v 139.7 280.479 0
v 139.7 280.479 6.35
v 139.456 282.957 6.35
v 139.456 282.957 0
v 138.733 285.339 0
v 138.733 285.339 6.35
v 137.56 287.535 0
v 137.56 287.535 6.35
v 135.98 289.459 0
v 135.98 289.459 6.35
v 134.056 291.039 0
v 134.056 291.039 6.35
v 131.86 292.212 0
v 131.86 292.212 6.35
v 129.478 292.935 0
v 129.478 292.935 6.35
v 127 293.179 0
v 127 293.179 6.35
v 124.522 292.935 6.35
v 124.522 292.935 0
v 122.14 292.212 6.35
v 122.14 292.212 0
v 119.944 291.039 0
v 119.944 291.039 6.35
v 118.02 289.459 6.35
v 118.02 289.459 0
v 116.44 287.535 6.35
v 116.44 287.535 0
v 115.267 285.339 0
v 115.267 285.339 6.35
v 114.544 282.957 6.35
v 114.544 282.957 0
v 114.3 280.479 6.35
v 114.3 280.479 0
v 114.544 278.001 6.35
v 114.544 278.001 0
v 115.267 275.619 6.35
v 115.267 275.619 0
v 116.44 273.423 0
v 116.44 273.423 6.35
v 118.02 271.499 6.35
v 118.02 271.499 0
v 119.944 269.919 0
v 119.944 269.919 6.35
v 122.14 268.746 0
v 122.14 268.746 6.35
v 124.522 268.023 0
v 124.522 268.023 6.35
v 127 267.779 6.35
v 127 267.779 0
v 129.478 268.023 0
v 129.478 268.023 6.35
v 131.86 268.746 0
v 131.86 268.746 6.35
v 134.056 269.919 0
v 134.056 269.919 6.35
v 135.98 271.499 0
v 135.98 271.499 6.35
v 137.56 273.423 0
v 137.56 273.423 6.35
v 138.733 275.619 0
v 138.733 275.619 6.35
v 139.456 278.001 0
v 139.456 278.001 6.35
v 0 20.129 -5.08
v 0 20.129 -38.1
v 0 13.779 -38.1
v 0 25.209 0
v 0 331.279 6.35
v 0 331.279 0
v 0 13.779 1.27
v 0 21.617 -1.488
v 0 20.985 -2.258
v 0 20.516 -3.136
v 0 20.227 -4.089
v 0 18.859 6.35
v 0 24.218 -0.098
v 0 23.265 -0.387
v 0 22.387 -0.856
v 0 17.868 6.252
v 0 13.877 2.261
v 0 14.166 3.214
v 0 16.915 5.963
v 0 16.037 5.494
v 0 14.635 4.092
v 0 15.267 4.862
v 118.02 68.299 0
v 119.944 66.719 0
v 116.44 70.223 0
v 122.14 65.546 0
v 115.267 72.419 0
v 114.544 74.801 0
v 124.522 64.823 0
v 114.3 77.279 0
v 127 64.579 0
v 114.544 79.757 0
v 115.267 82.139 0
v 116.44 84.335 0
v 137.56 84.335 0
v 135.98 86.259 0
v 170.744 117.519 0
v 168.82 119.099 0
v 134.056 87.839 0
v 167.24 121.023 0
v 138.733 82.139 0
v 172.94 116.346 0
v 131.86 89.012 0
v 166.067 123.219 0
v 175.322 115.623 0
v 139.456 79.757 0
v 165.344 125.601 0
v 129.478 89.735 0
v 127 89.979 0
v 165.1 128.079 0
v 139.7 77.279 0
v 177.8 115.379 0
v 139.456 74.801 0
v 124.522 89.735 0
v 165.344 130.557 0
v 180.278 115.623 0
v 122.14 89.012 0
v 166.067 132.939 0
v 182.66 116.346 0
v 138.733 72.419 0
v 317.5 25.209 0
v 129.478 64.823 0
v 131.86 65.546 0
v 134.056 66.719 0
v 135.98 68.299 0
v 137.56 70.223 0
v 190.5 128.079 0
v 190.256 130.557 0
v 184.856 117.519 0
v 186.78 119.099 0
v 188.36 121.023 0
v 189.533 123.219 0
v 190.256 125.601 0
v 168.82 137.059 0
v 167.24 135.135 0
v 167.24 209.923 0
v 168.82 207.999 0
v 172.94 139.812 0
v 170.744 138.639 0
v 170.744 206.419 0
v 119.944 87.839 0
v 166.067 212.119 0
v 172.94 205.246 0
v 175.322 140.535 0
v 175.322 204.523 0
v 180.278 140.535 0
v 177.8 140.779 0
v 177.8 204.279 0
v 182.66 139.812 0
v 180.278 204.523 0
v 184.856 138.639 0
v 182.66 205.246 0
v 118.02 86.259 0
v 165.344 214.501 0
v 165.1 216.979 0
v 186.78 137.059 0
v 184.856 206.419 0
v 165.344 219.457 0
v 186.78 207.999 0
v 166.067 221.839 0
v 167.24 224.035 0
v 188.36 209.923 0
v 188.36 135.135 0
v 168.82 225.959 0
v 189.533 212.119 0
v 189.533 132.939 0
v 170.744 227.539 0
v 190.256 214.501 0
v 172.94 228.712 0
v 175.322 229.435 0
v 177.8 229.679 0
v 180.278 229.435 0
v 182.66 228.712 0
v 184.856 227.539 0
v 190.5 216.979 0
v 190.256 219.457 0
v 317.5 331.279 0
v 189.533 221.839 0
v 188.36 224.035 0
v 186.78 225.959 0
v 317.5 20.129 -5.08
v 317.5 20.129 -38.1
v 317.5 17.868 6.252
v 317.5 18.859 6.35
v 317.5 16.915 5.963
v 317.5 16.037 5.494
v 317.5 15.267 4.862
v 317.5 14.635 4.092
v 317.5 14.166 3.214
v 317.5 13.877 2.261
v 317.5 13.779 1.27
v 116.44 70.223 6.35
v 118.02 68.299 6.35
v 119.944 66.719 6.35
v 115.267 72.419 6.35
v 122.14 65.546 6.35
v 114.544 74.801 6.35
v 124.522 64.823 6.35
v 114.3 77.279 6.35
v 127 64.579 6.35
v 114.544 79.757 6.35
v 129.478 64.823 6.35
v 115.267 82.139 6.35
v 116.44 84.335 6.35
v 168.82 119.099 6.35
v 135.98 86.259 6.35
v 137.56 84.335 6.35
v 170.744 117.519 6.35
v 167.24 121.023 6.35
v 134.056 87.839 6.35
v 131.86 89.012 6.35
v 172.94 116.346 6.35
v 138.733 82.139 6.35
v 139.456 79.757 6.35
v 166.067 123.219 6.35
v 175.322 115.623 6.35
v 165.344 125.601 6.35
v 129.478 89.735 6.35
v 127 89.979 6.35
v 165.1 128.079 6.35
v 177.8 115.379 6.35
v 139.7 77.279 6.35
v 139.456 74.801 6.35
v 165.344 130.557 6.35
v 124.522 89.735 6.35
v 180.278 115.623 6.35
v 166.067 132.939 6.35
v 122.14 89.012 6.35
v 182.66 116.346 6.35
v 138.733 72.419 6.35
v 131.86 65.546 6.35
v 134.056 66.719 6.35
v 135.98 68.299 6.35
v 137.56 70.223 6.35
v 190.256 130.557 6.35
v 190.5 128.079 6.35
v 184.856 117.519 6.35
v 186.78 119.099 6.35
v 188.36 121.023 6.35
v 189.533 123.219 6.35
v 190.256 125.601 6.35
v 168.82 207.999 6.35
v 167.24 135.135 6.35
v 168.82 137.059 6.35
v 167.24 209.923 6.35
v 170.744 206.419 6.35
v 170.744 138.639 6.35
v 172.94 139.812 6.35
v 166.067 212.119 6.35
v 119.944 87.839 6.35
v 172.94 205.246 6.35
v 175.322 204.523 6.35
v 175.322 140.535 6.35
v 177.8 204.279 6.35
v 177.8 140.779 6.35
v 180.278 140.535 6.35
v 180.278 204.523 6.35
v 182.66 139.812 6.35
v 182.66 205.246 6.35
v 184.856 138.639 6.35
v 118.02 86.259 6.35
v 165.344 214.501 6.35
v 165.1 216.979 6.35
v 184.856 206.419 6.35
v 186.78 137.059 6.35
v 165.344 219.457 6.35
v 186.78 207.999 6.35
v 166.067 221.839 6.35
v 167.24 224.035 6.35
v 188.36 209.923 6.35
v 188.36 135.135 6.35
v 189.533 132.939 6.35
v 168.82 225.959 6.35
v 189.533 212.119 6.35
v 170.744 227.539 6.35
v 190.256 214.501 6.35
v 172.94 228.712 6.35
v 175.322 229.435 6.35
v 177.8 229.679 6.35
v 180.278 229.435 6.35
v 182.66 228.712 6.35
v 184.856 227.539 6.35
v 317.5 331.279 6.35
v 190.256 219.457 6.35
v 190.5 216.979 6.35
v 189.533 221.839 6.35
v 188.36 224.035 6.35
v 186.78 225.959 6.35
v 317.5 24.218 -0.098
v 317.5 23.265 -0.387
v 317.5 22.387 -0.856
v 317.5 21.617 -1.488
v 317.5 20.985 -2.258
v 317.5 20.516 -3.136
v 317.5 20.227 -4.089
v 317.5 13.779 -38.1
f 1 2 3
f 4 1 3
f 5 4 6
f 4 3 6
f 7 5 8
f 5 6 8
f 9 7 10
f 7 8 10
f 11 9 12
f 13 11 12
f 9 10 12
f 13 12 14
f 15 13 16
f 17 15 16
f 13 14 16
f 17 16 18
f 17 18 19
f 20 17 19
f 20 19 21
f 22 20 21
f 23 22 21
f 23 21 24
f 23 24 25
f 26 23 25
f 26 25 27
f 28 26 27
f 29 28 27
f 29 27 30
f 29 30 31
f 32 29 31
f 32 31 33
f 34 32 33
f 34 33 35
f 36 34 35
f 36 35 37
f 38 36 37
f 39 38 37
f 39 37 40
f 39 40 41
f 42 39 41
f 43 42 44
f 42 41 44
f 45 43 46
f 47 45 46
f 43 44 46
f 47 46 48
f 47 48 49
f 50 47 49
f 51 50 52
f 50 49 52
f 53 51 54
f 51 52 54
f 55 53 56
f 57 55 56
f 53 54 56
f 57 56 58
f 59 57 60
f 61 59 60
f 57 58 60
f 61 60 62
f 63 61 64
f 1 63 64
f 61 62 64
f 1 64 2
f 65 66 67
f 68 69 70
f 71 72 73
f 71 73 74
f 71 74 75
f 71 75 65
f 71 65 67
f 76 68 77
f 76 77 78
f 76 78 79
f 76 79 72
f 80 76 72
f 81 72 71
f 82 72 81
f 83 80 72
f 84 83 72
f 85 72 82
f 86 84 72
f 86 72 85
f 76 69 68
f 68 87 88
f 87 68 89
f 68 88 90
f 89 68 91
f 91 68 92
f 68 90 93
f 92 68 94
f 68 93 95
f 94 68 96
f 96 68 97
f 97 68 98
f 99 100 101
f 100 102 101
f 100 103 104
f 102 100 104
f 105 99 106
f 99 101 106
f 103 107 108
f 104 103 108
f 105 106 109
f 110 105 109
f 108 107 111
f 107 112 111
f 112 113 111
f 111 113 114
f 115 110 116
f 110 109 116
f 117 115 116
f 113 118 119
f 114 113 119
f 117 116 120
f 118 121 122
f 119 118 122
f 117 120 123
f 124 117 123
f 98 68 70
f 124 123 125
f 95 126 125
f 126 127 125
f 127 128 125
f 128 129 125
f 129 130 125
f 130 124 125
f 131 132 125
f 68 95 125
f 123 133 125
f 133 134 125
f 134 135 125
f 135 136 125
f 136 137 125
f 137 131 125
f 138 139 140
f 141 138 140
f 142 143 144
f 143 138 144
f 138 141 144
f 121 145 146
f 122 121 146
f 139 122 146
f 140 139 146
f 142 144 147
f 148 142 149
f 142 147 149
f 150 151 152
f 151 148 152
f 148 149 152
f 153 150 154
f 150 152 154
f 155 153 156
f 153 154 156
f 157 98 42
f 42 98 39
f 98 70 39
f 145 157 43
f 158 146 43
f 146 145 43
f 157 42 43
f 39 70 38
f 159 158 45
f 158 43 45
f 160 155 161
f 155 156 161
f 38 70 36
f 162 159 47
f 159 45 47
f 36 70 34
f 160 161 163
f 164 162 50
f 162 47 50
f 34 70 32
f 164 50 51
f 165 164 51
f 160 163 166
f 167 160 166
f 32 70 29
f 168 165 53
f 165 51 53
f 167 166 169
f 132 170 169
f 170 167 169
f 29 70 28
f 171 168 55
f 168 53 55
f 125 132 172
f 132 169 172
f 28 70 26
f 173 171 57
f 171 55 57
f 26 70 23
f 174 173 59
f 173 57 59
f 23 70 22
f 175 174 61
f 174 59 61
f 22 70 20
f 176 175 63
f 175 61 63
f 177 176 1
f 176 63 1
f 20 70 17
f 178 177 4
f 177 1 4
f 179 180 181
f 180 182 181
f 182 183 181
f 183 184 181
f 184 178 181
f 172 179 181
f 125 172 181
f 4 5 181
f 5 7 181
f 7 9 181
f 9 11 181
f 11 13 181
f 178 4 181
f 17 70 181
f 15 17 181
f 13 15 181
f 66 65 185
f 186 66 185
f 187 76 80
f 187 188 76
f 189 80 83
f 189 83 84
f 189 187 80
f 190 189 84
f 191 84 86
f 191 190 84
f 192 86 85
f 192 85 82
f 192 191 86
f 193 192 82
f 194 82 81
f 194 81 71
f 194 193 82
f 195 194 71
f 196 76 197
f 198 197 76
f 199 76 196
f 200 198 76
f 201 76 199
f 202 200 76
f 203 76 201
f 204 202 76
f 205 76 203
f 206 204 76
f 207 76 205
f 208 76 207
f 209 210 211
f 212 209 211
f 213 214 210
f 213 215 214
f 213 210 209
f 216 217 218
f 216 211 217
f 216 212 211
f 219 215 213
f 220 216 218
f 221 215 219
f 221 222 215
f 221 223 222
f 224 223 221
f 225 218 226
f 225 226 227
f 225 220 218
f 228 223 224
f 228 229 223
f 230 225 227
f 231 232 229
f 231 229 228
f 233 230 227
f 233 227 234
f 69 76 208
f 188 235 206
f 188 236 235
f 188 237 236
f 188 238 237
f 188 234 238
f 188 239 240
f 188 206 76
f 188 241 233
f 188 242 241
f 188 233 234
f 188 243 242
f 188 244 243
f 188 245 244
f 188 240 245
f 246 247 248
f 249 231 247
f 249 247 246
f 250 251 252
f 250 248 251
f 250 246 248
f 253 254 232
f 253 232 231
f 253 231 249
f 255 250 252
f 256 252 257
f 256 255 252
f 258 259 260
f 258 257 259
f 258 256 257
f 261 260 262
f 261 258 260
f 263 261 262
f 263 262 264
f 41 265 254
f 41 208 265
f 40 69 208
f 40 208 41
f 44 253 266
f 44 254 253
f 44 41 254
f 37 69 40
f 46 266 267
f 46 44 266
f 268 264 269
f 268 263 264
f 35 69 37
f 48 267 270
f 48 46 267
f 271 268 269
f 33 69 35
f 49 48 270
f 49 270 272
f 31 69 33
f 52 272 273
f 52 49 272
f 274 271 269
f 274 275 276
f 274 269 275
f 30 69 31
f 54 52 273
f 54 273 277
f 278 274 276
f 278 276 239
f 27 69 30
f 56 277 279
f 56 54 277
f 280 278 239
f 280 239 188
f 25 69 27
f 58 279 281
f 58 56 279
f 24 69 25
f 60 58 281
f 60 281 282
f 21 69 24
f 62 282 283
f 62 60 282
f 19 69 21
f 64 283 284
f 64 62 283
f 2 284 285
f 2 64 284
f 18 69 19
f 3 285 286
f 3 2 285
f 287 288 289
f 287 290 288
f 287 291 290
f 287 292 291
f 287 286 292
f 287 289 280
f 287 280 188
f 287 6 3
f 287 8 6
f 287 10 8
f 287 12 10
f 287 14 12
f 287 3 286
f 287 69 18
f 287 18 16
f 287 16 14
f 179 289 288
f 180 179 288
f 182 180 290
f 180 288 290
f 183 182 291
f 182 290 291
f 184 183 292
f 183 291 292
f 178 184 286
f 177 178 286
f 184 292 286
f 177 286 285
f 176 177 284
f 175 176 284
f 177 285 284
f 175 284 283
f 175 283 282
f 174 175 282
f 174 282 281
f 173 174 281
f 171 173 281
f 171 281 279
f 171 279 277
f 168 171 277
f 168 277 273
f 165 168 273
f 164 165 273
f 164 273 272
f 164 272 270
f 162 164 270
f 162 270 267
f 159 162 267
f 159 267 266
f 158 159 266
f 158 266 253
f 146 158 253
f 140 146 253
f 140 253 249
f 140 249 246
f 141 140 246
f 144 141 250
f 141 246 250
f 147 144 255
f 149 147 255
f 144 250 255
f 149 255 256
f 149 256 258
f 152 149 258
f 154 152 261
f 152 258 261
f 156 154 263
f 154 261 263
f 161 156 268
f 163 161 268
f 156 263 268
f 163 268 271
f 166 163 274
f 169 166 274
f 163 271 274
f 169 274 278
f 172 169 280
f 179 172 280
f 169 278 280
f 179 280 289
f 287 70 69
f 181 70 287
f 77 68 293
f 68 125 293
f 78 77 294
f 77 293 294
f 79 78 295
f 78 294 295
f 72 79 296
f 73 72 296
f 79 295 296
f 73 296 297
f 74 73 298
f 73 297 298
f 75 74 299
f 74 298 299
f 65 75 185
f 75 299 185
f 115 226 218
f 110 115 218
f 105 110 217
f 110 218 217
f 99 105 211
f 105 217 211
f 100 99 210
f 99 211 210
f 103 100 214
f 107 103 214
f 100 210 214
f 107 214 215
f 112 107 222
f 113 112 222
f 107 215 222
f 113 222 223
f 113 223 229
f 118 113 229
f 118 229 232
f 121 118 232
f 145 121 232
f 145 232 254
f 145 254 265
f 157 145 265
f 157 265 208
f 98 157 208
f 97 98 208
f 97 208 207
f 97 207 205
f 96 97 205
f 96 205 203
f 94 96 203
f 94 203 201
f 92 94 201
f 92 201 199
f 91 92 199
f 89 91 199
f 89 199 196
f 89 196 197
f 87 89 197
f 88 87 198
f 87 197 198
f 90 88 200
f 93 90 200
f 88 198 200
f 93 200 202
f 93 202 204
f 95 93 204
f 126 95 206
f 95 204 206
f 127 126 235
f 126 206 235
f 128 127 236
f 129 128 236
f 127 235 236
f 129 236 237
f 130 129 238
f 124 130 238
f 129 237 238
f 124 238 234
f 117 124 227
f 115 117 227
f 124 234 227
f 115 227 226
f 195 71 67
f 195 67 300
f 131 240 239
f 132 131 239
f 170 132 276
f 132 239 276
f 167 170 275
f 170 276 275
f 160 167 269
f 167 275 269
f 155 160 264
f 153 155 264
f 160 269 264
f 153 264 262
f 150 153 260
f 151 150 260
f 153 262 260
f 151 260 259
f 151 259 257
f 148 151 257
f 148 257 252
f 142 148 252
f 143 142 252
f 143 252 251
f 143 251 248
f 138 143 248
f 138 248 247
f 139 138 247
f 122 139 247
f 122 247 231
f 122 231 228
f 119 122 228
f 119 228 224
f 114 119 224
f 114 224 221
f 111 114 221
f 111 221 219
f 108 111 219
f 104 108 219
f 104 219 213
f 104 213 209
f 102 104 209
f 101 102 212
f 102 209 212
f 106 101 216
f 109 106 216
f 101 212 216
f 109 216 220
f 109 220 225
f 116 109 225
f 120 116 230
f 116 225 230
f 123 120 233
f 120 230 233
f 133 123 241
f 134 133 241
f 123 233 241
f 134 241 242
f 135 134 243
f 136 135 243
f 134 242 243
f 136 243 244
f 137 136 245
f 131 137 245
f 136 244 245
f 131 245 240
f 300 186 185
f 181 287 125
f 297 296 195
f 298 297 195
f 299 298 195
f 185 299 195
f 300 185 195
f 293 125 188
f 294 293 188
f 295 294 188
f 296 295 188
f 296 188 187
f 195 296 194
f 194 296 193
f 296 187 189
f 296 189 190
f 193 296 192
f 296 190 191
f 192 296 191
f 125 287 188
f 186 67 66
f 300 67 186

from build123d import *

# Parameters (mm, degrees)
F0_W     = 317.5
F0_H     = 317.5
F1_DEPTH = 6.35
F2_W     = 317.5
F2_H     = 6.35
F3_DEPTH = 38.1
F4_R     = 5.08
F5_R     = 12.7
F6_DEPTH = 25.4


with BuildPart() as f1:
    # F0 (on Top) → F1 (new body)
    with BuildSketch(Plane.XY):
        with Locations((158.75, 172.529013)):
            Rectangle(F0_W, F0_H)
    extrude(amount=F1_DEPTH)

    # F2 (on face) → F3 (join)
    with BuildSketch(Plane(origin=(0, 0, 0), x_dir=(1, 0, 0), z_dir=(0, 0, -1))):
        with Locations((158.75, -16.954013)):
            Rectangle(F2_W, F2_H)
    extrude(amount=F3_DEPTH)

    # F4
    f4_edges = [f1.edges().sort_by_distance(p)[0] for p in [
        (158.75, 13.779013, 6.35),
        (158.75, 20.129013, 0),
    ]]
    fillet(f4_edges, radius=F4_R)

    # F5 (on face) → F6 (cut)
    with BuildSketch(Plane.XY.offset(6.35)):
        with Locations((127, 77.279013)):
            Circle(F5_R)
        with Locations((177.8, 128.079013)):
            Circle(F5_R)
        with Locations((177.8, 216.979013)):
            Circle(F5_R)
        with Locations((127, 280.479013)):
            Circle(F5_R)
    extrude(amount=-F6_DEPTH, mode=Mode.SUBTRACT)


solid = f1.part
